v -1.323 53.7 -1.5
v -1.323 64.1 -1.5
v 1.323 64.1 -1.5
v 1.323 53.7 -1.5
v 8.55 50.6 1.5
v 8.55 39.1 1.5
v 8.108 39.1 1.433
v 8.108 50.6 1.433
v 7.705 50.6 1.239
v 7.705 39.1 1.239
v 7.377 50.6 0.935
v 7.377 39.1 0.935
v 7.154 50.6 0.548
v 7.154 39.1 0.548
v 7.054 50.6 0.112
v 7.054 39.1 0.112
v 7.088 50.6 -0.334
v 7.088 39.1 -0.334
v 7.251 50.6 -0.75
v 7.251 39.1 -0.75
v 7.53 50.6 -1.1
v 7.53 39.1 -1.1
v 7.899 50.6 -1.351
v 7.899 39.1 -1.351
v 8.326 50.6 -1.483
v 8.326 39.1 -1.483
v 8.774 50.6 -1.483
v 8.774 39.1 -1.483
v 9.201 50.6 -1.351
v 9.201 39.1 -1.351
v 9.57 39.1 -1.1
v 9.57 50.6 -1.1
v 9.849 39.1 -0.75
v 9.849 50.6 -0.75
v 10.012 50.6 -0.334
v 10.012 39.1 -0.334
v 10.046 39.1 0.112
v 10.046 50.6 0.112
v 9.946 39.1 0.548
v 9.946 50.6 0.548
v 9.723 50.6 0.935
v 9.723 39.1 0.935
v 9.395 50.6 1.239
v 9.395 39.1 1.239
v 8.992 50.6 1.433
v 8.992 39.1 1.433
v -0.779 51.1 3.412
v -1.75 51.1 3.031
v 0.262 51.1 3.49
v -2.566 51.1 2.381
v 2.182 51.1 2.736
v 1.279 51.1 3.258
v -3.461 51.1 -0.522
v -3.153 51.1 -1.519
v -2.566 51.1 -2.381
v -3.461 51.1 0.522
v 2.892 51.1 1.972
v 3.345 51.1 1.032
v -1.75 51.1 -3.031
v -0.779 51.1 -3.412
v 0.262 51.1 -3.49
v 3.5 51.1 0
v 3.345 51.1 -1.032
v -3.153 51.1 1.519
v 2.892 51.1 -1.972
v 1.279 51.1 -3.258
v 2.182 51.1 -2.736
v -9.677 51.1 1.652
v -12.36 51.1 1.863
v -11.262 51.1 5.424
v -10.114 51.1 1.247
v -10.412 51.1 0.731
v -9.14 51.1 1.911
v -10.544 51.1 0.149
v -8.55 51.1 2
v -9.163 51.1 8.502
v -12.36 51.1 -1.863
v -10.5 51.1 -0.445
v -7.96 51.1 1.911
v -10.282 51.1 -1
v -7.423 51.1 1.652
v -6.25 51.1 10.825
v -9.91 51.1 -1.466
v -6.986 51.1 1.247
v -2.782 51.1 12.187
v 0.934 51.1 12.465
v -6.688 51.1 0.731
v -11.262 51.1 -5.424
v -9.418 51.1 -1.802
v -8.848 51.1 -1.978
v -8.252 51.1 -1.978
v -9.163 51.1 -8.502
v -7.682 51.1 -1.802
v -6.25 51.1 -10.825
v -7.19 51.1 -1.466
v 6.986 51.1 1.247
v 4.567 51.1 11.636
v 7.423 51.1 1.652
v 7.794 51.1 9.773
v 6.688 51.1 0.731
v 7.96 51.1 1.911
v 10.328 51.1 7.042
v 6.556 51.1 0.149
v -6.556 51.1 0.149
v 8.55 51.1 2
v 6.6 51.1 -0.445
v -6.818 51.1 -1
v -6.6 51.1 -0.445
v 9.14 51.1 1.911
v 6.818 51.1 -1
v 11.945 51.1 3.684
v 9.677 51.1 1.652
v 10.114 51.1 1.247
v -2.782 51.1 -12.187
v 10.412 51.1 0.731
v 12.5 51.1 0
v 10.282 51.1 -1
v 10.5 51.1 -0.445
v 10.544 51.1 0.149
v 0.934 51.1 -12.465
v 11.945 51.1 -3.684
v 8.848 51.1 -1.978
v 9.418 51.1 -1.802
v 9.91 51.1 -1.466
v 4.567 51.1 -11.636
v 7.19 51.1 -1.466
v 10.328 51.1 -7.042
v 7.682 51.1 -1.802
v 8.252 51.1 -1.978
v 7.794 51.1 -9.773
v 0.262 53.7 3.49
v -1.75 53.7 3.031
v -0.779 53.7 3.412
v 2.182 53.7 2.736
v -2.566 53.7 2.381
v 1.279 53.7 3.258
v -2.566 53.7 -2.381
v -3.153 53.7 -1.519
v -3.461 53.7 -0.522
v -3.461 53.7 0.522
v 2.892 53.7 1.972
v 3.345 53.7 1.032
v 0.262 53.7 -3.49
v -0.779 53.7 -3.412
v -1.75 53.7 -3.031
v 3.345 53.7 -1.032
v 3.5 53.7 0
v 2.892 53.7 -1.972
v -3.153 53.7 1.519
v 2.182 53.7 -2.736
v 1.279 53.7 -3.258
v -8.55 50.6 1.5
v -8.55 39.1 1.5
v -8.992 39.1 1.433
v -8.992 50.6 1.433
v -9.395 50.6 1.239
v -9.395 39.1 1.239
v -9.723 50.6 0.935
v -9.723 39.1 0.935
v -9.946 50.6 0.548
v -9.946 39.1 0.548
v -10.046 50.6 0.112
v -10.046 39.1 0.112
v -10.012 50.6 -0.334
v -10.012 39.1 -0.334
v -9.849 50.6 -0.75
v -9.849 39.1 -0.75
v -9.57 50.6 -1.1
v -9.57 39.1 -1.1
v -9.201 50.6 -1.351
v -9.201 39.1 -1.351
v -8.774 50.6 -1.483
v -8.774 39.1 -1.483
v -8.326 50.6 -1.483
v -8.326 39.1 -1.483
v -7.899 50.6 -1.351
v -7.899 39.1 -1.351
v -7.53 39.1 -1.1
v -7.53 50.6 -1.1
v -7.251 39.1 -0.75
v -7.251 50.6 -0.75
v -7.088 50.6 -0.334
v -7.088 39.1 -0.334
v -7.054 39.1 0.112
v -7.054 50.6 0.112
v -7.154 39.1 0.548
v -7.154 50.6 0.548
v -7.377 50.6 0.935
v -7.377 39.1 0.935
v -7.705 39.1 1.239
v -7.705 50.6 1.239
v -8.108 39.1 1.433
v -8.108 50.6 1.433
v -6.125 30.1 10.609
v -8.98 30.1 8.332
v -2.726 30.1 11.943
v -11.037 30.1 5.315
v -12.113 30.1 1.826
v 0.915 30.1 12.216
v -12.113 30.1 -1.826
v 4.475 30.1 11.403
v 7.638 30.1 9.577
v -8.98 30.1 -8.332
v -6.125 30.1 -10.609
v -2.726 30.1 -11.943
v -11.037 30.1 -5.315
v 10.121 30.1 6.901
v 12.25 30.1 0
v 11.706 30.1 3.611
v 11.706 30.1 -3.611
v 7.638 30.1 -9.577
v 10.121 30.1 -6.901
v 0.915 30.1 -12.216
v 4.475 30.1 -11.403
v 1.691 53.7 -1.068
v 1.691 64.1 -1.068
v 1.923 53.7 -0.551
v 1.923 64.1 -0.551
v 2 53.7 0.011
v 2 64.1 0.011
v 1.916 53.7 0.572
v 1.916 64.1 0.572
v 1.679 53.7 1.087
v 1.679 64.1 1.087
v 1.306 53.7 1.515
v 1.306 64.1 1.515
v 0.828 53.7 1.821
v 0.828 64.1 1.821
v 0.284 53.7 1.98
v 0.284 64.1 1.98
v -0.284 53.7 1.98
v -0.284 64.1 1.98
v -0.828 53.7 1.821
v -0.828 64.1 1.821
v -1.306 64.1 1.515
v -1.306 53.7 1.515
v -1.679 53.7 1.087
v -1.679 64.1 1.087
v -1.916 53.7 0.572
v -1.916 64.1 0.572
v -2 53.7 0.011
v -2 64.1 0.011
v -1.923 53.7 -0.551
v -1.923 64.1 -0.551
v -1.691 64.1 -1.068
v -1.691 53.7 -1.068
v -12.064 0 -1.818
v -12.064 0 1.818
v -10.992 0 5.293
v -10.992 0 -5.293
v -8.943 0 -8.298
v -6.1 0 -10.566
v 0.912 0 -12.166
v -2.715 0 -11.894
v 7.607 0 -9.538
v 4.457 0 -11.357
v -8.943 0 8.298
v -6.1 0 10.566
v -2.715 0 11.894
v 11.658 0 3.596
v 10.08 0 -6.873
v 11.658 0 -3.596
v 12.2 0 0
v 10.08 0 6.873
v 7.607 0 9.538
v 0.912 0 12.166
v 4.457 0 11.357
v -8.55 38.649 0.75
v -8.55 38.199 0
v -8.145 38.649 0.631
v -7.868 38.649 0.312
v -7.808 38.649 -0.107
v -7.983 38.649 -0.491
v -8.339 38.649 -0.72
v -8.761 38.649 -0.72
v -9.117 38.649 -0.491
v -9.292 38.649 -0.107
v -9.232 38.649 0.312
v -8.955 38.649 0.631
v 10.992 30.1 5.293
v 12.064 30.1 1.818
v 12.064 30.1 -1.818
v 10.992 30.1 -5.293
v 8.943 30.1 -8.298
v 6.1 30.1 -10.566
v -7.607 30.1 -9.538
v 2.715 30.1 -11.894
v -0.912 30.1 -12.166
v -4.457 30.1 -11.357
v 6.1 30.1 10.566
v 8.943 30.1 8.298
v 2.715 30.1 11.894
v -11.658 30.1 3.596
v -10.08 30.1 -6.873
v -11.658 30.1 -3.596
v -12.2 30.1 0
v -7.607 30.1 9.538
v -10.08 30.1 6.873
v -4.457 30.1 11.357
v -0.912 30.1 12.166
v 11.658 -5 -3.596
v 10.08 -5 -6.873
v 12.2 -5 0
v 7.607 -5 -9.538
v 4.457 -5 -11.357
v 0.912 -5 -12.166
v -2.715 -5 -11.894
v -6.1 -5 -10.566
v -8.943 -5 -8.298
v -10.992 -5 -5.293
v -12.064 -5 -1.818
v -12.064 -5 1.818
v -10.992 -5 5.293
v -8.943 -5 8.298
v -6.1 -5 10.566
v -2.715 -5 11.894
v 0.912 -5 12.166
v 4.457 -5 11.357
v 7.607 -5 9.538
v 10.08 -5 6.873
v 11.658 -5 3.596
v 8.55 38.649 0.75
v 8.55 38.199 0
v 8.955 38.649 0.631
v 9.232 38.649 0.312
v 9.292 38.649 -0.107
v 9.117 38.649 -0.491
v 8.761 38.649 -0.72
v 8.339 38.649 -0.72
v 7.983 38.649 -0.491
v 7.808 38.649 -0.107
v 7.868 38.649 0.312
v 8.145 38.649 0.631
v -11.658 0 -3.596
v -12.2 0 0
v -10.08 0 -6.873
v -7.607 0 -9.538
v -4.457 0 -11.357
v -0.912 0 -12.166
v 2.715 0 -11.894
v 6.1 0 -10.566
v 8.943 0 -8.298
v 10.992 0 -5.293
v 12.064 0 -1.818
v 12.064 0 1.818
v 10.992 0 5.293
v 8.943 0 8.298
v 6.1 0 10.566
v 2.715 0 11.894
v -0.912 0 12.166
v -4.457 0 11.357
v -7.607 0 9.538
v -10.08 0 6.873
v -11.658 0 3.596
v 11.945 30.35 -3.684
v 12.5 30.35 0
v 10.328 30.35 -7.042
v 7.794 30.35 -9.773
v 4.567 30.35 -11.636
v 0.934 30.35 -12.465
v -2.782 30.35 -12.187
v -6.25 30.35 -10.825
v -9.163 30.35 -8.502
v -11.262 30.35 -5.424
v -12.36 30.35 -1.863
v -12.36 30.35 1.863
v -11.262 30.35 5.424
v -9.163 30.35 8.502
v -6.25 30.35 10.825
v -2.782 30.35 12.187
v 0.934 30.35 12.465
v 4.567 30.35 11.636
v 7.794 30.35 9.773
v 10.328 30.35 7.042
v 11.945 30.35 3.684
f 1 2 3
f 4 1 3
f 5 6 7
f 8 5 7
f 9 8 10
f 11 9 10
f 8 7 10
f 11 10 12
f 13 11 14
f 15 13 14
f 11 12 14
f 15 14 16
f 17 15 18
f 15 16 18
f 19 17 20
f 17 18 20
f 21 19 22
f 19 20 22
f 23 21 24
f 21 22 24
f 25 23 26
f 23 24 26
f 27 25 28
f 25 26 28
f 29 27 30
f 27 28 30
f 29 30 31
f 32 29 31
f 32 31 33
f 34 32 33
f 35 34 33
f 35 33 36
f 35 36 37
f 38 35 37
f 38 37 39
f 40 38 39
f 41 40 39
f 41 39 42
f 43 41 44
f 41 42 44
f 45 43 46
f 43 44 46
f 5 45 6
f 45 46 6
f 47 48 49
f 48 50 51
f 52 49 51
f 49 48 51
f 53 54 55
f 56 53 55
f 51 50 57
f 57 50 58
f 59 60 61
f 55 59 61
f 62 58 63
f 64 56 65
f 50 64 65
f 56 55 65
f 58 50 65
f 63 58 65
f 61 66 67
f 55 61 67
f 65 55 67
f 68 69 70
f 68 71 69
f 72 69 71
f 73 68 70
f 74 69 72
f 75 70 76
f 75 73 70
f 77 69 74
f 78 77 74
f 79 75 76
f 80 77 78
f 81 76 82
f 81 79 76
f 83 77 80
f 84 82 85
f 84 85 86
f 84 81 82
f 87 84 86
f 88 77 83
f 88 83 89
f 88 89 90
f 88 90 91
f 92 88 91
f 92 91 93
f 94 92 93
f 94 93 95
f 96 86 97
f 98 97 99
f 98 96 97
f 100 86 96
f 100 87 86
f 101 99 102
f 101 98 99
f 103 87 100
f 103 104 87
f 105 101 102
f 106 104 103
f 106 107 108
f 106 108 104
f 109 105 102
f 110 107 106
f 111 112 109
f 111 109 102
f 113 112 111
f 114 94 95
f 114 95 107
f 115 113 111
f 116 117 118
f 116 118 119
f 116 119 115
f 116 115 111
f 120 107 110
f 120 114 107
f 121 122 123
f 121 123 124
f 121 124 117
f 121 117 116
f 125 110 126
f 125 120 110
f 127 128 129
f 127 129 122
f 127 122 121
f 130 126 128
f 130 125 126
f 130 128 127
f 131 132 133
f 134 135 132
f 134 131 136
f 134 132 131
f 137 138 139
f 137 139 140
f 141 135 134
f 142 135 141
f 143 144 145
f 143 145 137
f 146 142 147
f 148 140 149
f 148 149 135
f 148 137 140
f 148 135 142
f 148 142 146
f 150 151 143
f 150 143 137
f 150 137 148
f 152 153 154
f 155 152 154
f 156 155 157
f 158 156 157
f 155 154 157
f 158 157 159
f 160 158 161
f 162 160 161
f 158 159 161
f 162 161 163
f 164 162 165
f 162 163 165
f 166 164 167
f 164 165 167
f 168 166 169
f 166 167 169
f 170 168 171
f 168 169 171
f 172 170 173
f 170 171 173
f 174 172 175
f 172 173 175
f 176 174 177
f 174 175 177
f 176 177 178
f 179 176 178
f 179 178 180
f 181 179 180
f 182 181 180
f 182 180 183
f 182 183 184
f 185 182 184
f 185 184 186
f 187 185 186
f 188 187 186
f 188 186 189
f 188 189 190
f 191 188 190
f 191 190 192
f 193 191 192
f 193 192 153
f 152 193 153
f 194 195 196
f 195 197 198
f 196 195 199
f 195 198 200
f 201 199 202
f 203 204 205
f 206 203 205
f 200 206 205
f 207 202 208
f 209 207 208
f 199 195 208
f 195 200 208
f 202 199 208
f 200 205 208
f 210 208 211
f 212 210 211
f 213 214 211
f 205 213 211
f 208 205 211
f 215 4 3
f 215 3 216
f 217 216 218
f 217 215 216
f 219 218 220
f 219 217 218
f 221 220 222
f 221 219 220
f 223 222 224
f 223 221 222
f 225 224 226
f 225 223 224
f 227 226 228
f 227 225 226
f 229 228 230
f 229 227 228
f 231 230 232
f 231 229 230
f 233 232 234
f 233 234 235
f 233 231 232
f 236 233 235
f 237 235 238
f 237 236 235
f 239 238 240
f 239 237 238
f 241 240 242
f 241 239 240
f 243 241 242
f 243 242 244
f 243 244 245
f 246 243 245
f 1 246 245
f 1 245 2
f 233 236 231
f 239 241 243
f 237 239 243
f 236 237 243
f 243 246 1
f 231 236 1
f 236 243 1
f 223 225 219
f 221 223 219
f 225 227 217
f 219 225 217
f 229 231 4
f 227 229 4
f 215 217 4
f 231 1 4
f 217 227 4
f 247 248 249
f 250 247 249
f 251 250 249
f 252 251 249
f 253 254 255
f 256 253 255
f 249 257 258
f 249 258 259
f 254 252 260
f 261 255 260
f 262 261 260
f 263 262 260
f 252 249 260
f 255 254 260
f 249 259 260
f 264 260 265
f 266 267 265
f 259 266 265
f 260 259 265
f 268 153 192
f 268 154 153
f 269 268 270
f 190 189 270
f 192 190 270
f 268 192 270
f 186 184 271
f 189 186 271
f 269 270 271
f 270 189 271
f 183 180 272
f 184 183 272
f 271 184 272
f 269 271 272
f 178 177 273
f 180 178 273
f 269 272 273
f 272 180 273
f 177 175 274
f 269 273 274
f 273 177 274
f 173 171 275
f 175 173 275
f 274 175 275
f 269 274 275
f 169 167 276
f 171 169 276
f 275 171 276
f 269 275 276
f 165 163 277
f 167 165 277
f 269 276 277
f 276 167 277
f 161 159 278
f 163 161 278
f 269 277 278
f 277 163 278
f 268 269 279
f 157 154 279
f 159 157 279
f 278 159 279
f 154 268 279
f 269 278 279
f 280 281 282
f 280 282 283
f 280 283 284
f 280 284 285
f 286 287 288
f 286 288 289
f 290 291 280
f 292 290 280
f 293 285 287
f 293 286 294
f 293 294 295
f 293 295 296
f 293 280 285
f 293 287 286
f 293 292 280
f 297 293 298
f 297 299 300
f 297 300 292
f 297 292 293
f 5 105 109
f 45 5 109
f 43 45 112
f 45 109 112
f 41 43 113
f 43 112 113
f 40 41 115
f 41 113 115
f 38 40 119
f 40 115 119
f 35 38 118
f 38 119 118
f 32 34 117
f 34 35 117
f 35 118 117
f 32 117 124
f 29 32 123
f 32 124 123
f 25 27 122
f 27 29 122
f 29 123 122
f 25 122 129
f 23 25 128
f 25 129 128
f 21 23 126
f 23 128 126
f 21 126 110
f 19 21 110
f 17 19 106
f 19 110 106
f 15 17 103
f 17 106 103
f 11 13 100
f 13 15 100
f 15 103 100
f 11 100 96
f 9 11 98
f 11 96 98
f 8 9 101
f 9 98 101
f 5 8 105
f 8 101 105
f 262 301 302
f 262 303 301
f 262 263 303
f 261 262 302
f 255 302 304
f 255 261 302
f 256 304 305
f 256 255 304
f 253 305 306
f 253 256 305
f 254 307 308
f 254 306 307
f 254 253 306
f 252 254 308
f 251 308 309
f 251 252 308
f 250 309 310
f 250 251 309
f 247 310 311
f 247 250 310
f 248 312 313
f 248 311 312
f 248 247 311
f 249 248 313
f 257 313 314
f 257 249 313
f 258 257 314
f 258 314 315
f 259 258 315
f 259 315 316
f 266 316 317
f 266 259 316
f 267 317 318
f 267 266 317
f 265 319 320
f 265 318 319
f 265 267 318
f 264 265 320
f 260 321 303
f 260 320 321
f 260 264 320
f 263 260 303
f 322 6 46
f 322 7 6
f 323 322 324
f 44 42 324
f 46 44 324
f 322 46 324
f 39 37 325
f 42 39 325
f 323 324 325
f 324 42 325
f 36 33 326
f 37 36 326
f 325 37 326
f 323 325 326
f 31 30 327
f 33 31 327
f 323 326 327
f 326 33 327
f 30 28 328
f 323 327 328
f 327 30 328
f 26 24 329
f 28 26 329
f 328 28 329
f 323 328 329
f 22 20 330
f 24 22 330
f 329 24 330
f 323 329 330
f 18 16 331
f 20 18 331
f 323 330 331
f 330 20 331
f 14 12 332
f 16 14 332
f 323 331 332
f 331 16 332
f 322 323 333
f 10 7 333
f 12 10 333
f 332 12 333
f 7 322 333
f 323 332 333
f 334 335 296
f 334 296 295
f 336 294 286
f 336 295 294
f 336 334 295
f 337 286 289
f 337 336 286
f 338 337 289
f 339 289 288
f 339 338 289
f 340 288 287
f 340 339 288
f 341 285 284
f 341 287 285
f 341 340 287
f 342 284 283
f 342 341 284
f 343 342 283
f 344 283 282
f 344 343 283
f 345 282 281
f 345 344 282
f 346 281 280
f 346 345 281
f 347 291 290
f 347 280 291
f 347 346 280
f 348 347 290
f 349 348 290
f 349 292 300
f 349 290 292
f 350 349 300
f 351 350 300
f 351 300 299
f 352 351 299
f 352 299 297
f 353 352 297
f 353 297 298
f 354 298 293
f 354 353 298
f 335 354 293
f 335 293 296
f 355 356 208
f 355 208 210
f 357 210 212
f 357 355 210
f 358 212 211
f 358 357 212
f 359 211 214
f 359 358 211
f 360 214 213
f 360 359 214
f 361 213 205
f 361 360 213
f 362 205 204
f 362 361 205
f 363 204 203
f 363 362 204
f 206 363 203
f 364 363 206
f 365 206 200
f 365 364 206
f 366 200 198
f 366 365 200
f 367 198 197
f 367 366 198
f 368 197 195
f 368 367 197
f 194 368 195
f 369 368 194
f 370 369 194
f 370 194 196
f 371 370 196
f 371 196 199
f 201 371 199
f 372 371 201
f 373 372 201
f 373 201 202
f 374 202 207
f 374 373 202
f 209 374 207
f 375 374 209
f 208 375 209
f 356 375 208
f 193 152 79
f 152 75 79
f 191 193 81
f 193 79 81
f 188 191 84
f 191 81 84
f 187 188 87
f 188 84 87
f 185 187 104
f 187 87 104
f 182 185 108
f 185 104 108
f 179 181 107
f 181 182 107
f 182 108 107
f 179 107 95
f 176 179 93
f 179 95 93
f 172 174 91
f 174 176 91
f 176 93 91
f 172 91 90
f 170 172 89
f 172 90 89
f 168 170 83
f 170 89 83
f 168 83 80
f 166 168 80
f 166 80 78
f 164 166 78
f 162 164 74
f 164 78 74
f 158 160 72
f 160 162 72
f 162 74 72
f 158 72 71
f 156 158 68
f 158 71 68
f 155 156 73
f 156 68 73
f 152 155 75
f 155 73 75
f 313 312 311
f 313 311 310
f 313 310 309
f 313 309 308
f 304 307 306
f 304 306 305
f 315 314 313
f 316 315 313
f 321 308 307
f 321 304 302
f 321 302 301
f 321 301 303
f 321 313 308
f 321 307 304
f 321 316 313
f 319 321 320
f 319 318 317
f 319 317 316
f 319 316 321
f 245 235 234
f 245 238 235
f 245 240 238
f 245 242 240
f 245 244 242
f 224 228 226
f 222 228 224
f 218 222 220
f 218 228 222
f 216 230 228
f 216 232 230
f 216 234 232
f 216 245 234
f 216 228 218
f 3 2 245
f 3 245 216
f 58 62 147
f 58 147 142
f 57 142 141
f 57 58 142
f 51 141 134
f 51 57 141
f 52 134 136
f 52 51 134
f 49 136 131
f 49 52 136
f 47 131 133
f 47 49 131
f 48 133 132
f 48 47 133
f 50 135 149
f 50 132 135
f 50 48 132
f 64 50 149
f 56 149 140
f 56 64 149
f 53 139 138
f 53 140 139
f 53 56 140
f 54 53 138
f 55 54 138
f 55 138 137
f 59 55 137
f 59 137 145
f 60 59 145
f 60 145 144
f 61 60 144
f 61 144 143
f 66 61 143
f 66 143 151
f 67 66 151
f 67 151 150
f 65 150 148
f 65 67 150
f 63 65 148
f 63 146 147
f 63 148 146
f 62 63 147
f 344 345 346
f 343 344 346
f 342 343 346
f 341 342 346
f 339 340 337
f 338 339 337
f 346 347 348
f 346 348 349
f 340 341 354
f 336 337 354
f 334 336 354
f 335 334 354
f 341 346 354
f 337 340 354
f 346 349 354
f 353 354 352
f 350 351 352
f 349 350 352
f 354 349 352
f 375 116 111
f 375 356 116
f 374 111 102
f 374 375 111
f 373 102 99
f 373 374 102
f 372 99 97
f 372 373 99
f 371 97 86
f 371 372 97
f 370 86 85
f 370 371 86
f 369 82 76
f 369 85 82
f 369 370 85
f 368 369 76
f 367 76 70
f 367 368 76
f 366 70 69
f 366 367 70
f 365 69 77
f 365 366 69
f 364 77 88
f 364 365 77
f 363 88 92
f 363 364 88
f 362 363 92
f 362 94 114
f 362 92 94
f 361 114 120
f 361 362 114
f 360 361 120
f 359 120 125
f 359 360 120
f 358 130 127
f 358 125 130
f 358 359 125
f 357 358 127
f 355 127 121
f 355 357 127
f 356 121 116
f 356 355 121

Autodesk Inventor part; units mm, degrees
ref_plane "YZ Plane" through (0, 0, 0) normal (1, 0, 0) x (0, 1, 0)
ref_plane "XZ Plane" through (0, 0, 0) normal (0, 1, 0) x (-1, 0, 0)
ref_plane "XY Plane" through (0, 0, 0) normal (0, 0, 1) x (1, 0, 0)
sketch "Sketch1" plane through (0, 0, 0) normal (0, 1, 0) x (-1, 0, 0)
  circle A0 centre (0, 0) radius 12.2
  dimension "d0" = 24.4
extrude "Extrusion1" add sketch "Sketch1" along normal blind 30.1
sketch "Sketch2" plane through (0, 30.1, 0) normal (0, 1, 0) x (1, 0, 0)
  circle A0 centre (0, 0) radius 12.5
  dimension "d3" = 25
extrude "Extrusion2" add sketch "Sketch2" along normal blind 21 separate body
chamfer "Chamfer1" distance 0.25 angle 45 1 edges at (-12.5, 30.1, 0)
sketch "Sketch3" plane through (0, 51.1, 0) normal (0, 1, 0) x (1, 0, 0)
  circle A0 centre (0, 0) radius 8.55
  point P0 (-8.55, 0)
  point P1 (8.55, 0)
  dimension "d9" = 17.1
hole "Hole1" at (-8.55, 51.1, 0) at (8.55, 51.1, 0) direction (0, -1, 0) diameter 3 depth 12 tip angle 118 countersink diameter 4 countersink angle 90 bodies 2
sketch "Sketch4" plane through (0, 51.1, 0) normal (0, 1, 0) x (1, 0, 0)
  circle A0 centre (0, 0) radius 3.5
  circle A1 centre (0, 0) radius 2
  dimension "d18" = 7
  dimension "d19" = 4
extrude "Extrusion3" add sketch "Sketch4" along normal blind 2.6 separate body contours A0 | A1
extrude "Extrusion4" add sketch "Sketch4" along normal blind 10.4 from surface at 2.6 separate body contours A1
sketch "Sketch5" plane through (0, 64.1, 0) normal (0, 1, 0) x (1, 0, 0)
  circle A0 centre (0, 0) radius 2 projected
  line L0 (0, 0) -> (0, 1.5) construction
  line L1 (0, 1.5) -> (1.3229, 1.5) construction
  line L2 (0, 1.5) -> (-1.3229, 1.5) construction
  line L3 (-1.3229, 1.5) -> (1.3229, 1.5)
  dimension "d24" = 1.5
extrude "Extrusion5" cut sketch "Sketch5" against normal up to surface (10.4 mm away) contours L3 A0 picked at (-0.3089, 1.5908) bodies 4
sketch "Sketch6" plane through (0, 0, 0) normal (0, -1, 0) x (1, 0, 0)
  circle A0 centre (0, 0) radius 12.2 projected
extrude "Extrusion6" add sketch "Sketch6" along normal blind 5 from surface at 0 separate body
properties part number "dc12v1200rpm"
